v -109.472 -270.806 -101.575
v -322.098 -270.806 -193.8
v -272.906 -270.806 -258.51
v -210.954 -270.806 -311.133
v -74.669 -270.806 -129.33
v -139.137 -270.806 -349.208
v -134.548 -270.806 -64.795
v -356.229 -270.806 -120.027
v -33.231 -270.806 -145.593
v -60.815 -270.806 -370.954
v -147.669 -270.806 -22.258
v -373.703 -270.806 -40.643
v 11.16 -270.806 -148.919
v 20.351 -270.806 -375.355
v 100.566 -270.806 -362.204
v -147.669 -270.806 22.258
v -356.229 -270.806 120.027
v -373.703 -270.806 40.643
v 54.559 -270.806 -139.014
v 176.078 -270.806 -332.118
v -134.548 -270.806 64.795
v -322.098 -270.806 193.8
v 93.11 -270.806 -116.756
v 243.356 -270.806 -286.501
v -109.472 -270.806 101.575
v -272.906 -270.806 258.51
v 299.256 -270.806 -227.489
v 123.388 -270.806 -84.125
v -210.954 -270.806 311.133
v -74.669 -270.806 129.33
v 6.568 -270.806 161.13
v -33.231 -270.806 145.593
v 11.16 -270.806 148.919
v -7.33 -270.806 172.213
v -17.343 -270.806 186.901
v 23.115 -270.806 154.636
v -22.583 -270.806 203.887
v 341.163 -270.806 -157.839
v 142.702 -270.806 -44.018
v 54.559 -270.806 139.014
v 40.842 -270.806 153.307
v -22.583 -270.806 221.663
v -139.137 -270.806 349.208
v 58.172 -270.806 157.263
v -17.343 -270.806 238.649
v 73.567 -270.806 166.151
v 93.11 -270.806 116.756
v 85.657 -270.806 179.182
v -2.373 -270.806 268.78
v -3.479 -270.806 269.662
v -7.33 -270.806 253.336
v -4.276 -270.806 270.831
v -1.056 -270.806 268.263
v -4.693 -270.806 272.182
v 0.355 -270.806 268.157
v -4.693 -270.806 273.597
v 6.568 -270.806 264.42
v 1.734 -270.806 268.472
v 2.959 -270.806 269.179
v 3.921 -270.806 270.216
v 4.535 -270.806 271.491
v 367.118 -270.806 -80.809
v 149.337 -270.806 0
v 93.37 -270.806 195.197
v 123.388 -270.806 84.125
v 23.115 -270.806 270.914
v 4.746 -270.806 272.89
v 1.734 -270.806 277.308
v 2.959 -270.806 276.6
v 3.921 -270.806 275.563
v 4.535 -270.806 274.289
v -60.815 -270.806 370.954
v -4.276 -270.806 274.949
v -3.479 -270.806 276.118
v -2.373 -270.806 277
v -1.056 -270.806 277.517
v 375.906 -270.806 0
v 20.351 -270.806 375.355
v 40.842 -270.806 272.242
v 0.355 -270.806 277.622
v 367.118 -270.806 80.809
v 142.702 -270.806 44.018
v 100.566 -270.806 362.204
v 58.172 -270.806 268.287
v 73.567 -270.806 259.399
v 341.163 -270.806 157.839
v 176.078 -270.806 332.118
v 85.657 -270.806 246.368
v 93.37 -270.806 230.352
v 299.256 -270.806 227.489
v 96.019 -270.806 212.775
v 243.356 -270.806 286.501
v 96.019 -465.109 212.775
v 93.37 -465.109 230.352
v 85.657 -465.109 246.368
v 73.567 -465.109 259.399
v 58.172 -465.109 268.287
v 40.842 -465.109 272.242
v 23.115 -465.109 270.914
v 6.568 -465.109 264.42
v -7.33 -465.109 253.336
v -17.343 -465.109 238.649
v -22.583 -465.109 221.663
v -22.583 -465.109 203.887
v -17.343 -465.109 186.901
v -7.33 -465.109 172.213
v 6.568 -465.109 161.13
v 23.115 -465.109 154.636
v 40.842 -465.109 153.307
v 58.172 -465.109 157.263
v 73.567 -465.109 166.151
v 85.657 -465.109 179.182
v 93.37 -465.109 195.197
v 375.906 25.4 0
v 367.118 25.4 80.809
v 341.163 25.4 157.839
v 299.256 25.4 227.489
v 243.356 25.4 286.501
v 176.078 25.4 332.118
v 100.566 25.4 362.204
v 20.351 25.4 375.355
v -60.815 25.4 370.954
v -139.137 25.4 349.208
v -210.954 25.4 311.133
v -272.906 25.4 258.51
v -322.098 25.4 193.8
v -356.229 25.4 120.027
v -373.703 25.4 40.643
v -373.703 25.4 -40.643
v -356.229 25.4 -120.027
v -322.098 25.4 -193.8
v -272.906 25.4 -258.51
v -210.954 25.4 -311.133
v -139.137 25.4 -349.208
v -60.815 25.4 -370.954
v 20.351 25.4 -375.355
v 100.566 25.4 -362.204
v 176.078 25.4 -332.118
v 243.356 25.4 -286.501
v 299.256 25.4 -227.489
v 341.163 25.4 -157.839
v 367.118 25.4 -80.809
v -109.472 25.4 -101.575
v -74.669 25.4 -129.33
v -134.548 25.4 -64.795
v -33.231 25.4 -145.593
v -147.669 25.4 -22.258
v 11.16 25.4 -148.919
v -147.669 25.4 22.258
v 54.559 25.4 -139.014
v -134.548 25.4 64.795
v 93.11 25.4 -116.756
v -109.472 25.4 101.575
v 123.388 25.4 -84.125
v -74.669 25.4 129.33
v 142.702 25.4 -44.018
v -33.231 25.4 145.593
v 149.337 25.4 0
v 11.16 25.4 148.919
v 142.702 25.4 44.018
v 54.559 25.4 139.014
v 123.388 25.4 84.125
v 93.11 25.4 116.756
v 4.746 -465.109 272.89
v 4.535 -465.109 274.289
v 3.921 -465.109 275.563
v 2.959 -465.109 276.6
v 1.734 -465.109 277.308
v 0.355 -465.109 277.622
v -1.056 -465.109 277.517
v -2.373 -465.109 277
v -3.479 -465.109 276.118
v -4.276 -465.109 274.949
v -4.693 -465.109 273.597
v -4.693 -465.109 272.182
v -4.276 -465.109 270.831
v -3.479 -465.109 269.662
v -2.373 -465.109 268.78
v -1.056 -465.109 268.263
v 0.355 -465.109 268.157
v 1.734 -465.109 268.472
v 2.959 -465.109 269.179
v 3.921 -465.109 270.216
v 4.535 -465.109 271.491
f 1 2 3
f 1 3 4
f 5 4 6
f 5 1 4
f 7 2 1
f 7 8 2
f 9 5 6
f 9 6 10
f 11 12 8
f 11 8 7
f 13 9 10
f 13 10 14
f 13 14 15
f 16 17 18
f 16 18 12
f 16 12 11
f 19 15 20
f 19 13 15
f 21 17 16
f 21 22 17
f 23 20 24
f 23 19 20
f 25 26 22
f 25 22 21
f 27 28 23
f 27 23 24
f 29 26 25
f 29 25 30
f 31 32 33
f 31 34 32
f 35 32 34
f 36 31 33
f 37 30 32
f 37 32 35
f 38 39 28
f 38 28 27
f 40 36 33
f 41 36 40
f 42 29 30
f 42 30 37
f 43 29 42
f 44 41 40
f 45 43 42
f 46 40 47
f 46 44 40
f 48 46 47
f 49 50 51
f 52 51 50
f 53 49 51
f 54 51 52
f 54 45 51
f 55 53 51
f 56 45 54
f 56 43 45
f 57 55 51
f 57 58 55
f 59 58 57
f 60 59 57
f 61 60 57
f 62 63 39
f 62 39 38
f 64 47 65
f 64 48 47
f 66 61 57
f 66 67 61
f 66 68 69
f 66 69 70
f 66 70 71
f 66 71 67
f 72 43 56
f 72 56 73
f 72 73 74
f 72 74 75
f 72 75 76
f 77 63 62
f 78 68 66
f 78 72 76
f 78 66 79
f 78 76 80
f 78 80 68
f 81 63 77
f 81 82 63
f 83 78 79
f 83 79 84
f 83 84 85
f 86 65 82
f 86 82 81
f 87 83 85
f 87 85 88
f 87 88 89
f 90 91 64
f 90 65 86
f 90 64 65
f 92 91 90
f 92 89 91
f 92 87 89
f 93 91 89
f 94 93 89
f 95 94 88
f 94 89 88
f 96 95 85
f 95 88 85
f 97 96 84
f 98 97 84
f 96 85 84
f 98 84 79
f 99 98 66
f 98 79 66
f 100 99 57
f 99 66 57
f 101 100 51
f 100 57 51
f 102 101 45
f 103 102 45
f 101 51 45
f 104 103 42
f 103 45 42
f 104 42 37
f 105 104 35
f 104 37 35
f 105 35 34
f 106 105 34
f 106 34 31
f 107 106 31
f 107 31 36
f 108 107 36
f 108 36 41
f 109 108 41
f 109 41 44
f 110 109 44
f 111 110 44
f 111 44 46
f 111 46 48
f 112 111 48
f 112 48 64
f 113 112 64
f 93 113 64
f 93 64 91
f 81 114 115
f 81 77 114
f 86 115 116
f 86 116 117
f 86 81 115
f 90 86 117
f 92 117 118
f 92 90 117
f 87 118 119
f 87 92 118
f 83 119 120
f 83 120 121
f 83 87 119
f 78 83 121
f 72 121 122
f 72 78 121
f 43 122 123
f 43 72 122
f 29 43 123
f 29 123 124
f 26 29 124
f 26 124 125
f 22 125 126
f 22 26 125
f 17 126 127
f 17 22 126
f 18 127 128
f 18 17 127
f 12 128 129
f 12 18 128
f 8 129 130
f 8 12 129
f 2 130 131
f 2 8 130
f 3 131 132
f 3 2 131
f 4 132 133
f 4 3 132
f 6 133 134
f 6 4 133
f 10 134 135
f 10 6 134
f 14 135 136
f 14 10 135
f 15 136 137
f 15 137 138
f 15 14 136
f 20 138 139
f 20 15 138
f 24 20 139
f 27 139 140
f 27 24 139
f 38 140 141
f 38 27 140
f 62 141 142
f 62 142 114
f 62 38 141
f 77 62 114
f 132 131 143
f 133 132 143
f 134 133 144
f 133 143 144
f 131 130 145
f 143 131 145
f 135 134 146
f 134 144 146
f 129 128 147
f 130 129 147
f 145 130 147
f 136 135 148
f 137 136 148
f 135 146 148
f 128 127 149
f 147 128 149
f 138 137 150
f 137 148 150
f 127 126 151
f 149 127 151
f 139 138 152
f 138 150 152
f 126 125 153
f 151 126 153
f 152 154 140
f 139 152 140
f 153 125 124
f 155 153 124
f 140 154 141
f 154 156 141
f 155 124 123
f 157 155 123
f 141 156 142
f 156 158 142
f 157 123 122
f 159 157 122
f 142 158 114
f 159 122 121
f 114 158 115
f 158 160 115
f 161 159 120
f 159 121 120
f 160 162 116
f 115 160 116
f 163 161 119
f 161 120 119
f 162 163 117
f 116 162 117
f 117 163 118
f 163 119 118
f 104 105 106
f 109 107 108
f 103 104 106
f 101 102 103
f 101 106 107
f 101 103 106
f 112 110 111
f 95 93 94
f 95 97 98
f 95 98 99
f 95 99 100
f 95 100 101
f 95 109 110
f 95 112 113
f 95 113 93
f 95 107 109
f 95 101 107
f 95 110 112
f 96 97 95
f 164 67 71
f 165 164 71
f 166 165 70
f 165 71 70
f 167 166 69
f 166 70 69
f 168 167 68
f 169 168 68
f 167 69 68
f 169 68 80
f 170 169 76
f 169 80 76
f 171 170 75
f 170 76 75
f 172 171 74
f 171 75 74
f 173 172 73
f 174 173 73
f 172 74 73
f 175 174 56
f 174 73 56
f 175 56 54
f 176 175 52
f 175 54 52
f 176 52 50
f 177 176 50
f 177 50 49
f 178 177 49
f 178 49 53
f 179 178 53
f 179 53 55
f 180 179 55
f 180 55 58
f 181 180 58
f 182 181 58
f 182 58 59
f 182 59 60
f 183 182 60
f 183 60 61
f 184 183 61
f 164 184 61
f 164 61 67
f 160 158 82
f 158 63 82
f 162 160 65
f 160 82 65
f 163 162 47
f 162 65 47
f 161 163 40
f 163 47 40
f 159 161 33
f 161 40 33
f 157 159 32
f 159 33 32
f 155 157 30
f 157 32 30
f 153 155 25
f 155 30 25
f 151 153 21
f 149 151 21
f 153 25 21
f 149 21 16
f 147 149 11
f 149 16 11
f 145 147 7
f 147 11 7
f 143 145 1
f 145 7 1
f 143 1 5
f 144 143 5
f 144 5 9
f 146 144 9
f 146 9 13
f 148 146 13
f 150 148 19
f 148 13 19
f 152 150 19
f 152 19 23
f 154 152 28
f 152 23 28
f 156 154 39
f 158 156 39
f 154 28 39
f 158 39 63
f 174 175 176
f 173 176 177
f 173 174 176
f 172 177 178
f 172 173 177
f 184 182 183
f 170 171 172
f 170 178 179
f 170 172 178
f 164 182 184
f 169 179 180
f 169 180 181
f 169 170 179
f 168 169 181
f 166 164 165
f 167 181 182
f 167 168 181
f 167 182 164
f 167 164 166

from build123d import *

# Parameters (mm, degrees)
F0_R     = 375.9060987096
F1_DEPTH = 270.80607
F2_R     = 149.3370096155
F3_DEPTH = 705.40455
F4_R     = 4.7459118068
F4_R_2   = 59.6341764552
F5_DEPTH = 465.10949
F7_DEPTH = 25.4


with BuildPart() as f1:
    # F0 (on Front) → F1 (new body)
    with BuildSketch(Plane.XZ):
        Circle(F0_R)
    extrude(amount=F1_DEPTH)

    # F2 (on Front) → F3 (cut)
    with BuildSketch(Plane.XZ):
        Circle(F2_R)
    extrude(amount=F3_DEPTH, mode=Mode.SUBTRACT)

    # F4 (on Front) → F5 (join)
    with BuildSketch(Plane.XZ):
        with Locations((0, 272.8897631168)):
            Circle(F4_R)
        with Locations((36.3853052258, 212.7749174833)):
            Circle(F4_R_2)
    extrude(amount=F5_DEPTH)

    # F7 (add): a face of the model
    f7_faces = [f1.faces().sort_by_distance(p)[0] for p in [
        (-365.2738686502, 0, 0),
    ]]
    extrude(f7_faces, amount=F7_DEPTH)


solid = f1.part
